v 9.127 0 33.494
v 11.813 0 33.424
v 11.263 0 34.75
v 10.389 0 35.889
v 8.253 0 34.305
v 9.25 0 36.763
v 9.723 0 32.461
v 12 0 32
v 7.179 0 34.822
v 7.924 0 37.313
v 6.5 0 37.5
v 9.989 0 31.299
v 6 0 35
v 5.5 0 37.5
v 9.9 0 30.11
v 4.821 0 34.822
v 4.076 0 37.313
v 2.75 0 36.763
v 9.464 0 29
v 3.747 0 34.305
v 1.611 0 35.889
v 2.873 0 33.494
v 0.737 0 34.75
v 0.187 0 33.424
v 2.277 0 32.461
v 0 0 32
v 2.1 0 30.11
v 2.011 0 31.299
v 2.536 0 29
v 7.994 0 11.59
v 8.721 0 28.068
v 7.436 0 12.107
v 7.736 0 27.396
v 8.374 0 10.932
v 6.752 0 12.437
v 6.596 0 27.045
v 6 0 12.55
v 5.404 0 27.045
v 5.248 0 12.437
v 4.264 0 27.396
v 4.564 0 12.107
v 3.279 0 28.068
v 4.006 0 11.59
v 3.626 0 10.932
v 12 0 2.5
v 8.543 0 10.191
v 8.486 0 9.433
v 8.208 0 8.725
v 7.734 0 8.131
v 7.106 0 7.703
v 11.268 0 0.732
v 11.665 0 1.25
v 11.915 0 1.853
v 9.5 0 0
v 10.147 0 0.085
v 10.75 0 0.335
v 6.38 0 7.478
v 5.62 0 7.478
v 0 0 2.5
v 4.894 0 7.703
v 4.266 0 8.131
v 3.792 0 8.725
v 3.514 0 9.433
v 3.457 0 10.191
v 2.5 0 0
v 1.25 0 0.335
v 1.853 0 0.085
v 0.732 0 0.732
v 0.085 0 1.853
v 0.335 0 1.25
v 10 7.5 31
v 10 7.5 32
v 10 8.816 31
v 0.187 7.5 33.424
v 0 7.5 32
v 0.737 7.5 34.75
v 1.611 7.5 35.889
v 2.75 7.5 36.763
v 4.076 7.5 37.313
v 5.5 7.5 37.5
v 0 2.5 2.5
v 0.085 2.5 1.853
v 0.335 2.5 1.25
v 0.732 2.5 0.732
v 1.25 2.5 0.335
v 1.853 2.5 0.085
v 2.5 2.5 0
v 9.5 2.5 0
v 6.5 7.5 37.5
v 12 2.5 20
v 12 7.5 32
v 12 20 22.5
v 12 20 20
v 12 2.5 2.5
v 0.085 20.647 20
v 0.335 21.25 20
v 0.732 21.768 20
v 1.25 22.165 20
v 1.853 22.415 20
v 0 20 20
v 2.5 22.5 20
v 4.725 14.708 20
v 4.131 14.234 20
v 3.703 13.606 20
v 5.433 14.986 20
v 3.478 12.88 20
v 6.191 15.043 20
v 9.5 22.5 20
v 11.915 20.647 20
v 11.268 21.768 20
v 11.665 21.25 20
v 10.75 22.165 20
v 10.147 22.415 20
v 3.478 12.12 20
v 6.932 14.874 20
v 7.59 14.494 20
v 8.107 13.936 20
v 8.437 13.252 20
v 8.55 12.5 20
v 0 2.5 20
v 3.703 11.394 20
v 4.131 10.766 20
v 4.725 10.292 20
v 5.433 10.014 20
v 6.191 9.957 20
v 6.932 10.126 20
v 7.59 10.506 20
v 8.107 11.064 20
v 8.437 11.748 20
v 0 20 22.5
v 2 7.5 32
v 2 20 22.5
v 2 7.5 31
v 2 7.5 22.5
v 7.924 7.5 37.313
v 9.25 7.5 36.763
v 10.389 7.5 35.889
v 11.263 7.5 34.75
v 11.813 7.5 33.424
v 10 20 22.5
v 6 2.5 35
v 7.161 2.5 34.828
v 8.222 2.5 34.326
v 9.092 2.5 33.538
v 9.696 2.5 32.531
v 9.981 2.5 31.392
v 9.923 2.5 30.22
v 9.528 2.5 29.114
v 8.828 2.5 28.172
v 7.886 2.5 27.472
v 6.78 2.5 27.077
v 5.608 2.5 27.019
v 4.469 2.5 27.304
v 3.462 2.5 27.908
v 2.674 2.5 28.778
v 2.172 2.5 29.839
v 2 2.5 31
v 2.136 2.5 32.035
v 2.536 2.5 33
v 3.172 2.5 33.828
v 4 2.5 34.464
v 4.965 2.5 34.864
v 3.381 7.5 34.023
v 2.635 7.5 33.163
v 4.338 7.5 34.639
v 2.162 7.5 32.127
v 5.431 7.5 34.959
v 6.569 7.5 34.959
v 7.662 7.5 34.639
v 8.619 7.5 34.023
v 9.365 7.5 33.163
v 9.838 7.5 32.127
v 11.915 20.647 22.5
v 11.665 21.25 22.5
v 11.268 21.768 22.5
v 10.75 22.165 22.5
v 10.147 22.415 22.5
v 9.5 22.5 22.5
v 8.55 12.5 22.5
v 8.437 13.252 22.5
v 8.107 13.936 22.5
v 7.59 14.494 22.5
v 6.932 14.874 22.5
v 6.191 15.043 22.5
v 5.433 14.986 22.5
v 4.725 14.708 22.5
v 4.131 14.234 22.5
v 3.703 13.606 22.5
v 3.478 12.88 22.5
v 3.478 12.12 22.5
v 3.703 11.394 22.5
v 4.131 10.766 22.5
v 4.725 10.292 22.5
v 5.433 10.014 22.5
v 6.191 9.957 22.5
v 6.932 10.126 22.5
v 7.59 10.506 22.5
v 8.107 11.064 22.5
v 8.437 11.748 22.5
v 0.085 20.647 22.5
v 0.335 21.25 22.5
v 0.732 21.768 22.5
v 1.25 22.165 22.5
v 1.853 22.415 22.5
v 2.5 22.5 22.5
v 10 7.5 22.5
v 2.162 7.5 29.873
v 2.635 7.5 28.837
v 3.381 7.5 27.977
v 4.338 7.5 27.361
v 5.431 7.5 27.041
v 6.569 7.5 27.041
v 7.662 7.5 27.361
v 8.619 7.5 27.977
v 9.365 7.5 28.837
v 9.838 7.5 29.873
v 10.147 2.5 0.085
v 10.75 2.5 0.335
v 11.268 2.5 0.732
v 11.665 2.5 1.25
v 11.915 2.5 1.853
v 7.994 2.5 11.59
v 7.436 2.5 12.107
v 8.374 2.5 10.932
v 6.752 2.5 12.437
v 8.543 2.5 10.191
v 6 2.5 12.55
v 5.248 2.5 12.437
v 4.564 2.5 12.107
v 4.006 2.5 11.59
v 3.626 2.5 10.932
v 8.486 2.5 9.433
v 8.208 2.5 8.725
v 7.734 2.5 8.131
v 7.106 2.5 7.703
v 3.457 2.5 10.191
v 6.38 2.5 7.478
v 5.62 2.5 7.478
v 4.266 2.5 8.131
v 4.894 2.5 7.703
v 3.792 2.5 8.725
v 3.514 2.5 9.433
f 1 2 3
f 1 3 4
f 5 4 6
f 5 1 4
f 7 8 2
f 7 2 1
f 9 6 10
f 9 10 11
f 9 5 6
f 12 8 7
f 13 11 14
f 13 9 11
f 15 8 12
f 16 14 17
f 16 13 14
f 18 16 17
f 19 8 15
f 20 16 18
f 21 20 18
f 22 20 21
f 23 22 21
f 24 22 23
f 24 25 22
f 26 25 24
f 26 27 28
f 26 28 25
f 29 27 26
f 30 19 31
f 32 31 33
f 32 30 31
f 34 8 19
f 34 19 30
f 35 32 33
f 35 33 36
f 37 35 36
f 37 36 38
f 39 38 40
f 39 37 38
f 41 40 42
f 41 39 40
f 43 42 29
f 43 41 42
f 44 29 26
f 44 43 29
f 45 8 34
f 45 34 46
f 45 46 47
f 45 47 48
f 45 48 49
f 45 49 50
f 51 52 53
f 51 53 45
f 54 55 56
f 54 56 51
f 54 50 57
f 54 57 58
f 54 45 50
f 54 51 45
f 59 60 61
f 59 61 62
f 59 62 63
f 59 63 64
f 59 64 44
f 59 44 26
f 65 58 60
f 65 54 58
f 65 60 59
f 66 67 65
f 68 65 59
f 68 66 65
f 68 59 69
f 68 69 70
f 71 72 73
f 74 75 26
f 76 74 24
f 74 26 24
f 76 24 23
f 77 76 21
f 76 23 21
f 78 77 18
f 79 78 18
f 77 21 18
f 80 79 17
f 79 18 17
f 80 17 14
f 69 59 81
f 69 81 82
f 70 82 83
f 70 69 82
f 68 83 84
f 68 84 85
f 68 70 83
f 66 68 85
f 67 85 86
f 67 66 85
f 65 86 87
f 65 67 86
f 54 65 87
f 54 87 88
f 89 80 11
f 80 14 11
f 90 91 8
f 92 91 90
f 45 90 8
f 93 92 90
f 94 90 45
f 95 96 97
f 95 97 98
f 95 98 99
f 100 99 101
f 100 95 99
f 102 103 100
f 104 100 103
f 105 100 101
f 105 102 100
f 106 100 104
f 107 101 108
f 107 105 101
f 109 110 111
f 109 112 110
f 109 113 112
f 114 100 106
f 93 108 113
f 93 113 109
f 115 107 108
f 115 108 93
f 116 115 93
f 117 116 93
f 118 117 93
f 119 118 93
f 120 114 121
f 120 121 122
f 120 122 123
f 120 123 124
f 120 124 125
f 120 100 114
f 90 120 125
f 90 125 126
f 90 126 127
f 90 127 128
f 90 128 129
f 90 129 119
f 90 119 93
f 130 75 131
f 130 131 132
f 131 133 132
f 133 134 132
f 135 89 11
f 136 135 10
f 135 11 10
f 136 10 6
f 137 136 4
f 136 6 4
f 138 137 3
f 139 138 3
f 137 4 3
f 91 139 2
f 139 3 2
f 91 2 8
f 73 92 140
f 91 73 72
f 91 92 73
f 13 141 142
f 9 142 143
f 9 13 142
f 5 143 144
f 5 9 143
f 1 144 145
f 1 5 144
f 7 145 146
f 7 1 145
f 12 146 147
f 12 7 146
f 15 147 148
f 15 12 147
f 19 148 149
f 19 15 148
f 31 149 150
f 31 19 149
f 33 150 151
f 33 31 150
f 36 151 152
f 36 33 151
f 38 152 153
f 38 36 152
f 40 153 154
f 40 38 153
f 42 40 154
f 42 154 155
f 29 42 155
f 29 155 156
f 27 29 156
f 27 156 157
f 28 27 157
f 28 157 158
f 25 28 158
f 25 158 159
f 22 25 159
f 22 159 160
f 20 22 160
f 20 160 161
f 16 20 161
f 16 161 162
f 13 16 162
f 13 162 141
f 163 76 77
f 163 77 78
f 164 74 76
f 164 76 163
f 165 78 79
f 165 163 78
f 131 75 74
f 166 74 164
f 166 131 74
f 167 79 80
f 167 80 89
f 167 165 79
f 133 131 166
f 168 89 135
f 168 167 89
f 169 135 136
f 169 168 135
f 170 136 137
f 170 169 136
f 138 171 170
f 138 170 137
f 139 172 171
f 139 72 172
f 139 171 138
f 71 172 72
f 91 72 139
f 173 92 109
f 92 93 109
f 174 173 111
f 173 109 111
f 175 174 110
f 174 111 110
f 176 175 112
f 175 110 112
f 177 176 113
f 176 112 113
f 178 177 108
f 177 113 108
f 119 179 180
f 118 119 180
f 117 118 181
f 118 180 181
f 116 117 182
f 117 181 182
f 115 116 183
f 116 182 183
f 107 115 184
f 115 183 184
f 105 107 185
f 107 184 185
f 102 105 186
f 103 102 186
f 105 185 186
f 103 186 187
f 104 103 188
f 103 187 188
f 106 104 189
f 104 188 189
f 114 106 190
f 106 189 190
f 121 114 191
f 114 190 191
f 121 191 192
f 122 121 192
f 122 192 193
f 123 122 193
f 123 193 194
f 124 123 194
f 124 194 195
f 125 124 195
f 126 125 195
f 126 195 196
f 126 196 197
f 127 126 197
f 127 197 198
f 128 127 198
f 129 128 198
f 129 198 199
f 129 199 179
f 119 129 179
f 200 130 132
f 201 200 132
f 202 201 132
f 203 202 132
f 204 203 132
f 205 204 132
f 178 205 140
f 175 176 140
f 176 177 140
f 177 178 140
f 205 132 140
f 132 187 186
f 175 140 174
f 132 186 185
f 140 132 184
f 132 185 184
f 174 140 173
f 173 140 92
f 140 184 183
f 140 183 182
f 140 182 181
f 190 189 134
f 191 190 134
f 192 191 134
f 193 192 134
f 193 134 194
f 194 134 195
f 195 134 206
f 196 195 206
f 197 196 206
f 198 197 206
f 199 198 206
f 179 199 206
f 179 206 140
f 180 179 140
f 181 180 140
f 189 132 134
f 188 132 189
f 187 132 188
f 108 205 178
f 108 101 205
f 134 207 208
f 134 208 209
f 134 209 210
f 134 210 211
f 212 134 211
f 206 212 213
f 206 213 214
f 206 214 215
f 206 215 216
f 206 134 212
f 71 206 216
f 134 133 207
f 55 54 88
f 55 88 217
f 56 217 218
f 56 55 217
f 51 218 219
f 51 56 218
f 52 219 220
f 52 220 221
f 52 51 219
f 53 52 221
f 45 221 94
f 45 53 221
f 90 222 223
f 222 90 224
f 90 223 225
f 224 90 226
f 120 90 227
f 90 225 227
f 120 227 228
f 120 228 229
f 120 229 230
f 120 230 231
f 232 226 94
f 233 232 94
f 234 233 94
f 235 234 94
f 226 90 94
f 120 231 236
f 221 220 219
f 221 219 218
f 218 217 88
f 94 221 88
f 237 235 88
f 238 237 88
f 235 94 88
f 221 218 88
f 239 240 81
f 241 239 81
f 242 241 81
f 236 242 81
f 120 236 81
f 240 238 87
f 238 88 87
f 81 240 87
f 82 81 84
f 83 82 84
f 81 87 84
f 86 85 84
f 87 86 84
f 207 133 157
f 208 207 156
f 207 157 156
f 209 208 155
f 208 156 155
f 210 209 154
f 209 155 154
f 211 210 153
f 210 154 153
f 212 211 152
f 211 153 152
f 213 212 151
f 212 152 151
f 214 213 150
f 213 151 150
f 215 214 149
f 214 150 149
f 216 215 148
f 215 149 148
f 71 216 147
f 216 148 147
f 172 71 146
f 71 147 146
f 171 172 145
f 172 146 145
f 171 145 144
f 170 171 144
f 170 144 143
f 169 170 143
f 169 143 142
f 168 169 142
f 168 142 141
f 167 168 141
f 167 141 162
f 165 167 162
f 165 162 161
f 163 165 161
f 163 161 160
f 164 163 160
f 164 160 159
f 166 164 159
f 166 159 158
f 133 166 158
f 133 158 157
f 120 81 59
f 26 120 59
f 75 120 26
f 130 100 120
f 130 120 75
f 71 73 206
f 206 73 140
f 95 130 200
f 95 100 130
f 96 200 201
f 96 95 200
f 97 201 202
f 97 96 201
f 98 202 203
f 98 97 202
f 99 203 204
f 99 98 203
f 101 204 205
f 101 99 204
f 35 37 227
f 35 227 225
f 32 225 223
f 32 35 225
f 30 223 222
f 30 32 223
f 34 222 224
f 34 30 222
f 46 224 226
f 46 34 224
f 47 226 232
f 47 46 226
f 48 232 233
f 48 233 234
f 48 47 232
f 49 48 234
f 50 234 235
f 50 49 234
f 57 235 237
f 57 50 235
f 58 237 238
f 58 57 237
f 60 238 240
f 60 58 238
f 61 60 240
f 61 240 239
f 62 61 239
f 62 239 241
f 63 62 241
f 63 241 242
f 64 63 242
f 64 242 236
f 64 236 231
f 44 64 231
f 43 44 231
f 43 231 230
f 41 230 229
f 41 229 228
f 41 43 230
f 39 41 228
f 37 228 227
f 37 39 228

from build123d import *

# Parameters (mm, degrees)
SKETCH_1_R          = 2.55
SKETCH_1_R_2        = 4
EXTRUDE_1_DEPTH     = 2.5
SKETCH_2_W          = 12
SKETCH_2_H          = 2.5
EXTRUDE_2_DEPTH     = 20
SKETCH_3_R          = 2.55
CUT_EXTRUDE_1_DEPTH = 20
FILLET_1_R          = 2.5
EXTRUDE_3_DEPTH     = 5
EXTRUDE_4_DEPTH     = 2
EXTRUDE_5_DEPTH     = 2
SKETCH_7_R          = 4
CUT_EXTRUDE_2_DEPTH = 45.161634934


with BuildPart() as part:
    # Эскиз1 → Бобышка-Вытянуть1 (new body)
    with BuildSketch(Plane(origin=(0, 0, 0), x_dir=(1, 0, 0), z_dir=(0, 1, 0))):
        with BuildLine():
            Line((2.5, 0), (9.5, 0))
            ThreePointArc((9.5, 0), (11.267766953, -0.732233047), (12, -2.5))
            Line((12, -2.5), (12, -32))
            ThreePointArc((12, -32), (10.389087297, -35.889087297), (6.5, -37.5))
            Line((6.5, -37.5), (5.5, -37.5))
            ThreePointArc((5.5, -37.5), (1.610912703, -35.889087297), (0, -32))
            Line((0, -32), (0, -2.5))
            ThreePointArc((0, -2.5), (0.732233047, -0.732233047), (2.5, 0))
        make_face()
        with Locations(Location((6, -10, 0), (0, 0, 270))):
            Circle(SKETCH_1_R, mode=Mode.SUBTRACT)
        with Locations(Location((6, -31, 0), (0, 0, 270))):
            Circle(SKETCH_1_R_2, mode=Mode.SUBTRACT)
    extrude(amount=EXTRUDE_1_DEPTH)

    # Эскиз2 → Бобышка-Вытянуть2 (add)
    with BuildSketch(Plane(origin=(0, 2.5, 0), x_dir=(1, 0, 0), z_dir=(0, 1, 0))):
        with Locations((6, -21.25)):
            Rectangle(SKETCH_2_W, SKETCH_2_H)
    extrude(amount=EXTRUDE_2_DEPTH)

    # Эскиз3 → Вырез-Вытянуть1 (cut)
    with BuildSketch(Plane.XY.offset(22.5)):
        with Locations((6, 12.5)):
            Circle(SKETCH_3_R)
    extrude(amount=-CUT_EXTRUDE_1_DEPTH, mode=Mode.SUBTRACT)

    # Скругление1
    fillet_1_edges = [part.edges().sort_by_distance(p)[0] for p in [
        (0, 22.5, 21.25),
        (12, 22.5, 21.25),
    ]]
    fillet(fillet_1_edges, radius=FILLET_1_R)

    # Эскиз4 → Бобышка-Вытянуть3 (add)
    with BuildSketch(Plane(origin=(0, 2.5, 0), x_dir=(1, 0, 0), z_dir=(0, 1, 0))):
        with BuildLine():
            Line((12, -22.5), (0, -22.5))
            Line((0, -22.5), (0, -32))
            ThreePointArc((0, -32), (1.610912703, -35.889087297), (5.5, -37.5))
            Line((5.5, -37.5), (6.5, -37.5))
            ThreePointArc((6.5, -37.5), (10.389087297, -35.889087297), (12, -32))
            Line((12, -32), (12, -22.5))
        make_face()
    extrude(amount=EXTRUDE_3_DEPTH)

    # Эскиз5 → Бобышка-Вытянуть4 (add)
    with BuildSketch(Plane(origin=(12, 0, 0), x_dir=(0, 0, -1), z_dir=(1, 0, 0))):
        Polygon((-32, 7.5), (-22.5, 7.5), (-22.5, 20), align=None)
    extrude(amount=-EXTRUDE_4_DEPTH)

    # Эскиз6 → Бобышка-Вытянуть5 (add)
    with BuildSketch(Plane.ZY):
        Polygon((32, 7.5), (22.5, 20), (22.5, 7.5), align=None)
    extrude(amount=-EXTRUDE_5_DEPTH)

    # Эскиз7 → Вырез-Вытянуть2 (cut, through all)
    with BuildSketch(Plane.XZ.offset(-2.5)):
        with Locations(Location((6, 31, 0), (0, 0, 180))):
            Circle(SKETCH_7_R)
    extrude(amount=-CUT_EXTRUDE_2_DEPTH, mode=Mode.SUBTRACT)


solid = part.part
